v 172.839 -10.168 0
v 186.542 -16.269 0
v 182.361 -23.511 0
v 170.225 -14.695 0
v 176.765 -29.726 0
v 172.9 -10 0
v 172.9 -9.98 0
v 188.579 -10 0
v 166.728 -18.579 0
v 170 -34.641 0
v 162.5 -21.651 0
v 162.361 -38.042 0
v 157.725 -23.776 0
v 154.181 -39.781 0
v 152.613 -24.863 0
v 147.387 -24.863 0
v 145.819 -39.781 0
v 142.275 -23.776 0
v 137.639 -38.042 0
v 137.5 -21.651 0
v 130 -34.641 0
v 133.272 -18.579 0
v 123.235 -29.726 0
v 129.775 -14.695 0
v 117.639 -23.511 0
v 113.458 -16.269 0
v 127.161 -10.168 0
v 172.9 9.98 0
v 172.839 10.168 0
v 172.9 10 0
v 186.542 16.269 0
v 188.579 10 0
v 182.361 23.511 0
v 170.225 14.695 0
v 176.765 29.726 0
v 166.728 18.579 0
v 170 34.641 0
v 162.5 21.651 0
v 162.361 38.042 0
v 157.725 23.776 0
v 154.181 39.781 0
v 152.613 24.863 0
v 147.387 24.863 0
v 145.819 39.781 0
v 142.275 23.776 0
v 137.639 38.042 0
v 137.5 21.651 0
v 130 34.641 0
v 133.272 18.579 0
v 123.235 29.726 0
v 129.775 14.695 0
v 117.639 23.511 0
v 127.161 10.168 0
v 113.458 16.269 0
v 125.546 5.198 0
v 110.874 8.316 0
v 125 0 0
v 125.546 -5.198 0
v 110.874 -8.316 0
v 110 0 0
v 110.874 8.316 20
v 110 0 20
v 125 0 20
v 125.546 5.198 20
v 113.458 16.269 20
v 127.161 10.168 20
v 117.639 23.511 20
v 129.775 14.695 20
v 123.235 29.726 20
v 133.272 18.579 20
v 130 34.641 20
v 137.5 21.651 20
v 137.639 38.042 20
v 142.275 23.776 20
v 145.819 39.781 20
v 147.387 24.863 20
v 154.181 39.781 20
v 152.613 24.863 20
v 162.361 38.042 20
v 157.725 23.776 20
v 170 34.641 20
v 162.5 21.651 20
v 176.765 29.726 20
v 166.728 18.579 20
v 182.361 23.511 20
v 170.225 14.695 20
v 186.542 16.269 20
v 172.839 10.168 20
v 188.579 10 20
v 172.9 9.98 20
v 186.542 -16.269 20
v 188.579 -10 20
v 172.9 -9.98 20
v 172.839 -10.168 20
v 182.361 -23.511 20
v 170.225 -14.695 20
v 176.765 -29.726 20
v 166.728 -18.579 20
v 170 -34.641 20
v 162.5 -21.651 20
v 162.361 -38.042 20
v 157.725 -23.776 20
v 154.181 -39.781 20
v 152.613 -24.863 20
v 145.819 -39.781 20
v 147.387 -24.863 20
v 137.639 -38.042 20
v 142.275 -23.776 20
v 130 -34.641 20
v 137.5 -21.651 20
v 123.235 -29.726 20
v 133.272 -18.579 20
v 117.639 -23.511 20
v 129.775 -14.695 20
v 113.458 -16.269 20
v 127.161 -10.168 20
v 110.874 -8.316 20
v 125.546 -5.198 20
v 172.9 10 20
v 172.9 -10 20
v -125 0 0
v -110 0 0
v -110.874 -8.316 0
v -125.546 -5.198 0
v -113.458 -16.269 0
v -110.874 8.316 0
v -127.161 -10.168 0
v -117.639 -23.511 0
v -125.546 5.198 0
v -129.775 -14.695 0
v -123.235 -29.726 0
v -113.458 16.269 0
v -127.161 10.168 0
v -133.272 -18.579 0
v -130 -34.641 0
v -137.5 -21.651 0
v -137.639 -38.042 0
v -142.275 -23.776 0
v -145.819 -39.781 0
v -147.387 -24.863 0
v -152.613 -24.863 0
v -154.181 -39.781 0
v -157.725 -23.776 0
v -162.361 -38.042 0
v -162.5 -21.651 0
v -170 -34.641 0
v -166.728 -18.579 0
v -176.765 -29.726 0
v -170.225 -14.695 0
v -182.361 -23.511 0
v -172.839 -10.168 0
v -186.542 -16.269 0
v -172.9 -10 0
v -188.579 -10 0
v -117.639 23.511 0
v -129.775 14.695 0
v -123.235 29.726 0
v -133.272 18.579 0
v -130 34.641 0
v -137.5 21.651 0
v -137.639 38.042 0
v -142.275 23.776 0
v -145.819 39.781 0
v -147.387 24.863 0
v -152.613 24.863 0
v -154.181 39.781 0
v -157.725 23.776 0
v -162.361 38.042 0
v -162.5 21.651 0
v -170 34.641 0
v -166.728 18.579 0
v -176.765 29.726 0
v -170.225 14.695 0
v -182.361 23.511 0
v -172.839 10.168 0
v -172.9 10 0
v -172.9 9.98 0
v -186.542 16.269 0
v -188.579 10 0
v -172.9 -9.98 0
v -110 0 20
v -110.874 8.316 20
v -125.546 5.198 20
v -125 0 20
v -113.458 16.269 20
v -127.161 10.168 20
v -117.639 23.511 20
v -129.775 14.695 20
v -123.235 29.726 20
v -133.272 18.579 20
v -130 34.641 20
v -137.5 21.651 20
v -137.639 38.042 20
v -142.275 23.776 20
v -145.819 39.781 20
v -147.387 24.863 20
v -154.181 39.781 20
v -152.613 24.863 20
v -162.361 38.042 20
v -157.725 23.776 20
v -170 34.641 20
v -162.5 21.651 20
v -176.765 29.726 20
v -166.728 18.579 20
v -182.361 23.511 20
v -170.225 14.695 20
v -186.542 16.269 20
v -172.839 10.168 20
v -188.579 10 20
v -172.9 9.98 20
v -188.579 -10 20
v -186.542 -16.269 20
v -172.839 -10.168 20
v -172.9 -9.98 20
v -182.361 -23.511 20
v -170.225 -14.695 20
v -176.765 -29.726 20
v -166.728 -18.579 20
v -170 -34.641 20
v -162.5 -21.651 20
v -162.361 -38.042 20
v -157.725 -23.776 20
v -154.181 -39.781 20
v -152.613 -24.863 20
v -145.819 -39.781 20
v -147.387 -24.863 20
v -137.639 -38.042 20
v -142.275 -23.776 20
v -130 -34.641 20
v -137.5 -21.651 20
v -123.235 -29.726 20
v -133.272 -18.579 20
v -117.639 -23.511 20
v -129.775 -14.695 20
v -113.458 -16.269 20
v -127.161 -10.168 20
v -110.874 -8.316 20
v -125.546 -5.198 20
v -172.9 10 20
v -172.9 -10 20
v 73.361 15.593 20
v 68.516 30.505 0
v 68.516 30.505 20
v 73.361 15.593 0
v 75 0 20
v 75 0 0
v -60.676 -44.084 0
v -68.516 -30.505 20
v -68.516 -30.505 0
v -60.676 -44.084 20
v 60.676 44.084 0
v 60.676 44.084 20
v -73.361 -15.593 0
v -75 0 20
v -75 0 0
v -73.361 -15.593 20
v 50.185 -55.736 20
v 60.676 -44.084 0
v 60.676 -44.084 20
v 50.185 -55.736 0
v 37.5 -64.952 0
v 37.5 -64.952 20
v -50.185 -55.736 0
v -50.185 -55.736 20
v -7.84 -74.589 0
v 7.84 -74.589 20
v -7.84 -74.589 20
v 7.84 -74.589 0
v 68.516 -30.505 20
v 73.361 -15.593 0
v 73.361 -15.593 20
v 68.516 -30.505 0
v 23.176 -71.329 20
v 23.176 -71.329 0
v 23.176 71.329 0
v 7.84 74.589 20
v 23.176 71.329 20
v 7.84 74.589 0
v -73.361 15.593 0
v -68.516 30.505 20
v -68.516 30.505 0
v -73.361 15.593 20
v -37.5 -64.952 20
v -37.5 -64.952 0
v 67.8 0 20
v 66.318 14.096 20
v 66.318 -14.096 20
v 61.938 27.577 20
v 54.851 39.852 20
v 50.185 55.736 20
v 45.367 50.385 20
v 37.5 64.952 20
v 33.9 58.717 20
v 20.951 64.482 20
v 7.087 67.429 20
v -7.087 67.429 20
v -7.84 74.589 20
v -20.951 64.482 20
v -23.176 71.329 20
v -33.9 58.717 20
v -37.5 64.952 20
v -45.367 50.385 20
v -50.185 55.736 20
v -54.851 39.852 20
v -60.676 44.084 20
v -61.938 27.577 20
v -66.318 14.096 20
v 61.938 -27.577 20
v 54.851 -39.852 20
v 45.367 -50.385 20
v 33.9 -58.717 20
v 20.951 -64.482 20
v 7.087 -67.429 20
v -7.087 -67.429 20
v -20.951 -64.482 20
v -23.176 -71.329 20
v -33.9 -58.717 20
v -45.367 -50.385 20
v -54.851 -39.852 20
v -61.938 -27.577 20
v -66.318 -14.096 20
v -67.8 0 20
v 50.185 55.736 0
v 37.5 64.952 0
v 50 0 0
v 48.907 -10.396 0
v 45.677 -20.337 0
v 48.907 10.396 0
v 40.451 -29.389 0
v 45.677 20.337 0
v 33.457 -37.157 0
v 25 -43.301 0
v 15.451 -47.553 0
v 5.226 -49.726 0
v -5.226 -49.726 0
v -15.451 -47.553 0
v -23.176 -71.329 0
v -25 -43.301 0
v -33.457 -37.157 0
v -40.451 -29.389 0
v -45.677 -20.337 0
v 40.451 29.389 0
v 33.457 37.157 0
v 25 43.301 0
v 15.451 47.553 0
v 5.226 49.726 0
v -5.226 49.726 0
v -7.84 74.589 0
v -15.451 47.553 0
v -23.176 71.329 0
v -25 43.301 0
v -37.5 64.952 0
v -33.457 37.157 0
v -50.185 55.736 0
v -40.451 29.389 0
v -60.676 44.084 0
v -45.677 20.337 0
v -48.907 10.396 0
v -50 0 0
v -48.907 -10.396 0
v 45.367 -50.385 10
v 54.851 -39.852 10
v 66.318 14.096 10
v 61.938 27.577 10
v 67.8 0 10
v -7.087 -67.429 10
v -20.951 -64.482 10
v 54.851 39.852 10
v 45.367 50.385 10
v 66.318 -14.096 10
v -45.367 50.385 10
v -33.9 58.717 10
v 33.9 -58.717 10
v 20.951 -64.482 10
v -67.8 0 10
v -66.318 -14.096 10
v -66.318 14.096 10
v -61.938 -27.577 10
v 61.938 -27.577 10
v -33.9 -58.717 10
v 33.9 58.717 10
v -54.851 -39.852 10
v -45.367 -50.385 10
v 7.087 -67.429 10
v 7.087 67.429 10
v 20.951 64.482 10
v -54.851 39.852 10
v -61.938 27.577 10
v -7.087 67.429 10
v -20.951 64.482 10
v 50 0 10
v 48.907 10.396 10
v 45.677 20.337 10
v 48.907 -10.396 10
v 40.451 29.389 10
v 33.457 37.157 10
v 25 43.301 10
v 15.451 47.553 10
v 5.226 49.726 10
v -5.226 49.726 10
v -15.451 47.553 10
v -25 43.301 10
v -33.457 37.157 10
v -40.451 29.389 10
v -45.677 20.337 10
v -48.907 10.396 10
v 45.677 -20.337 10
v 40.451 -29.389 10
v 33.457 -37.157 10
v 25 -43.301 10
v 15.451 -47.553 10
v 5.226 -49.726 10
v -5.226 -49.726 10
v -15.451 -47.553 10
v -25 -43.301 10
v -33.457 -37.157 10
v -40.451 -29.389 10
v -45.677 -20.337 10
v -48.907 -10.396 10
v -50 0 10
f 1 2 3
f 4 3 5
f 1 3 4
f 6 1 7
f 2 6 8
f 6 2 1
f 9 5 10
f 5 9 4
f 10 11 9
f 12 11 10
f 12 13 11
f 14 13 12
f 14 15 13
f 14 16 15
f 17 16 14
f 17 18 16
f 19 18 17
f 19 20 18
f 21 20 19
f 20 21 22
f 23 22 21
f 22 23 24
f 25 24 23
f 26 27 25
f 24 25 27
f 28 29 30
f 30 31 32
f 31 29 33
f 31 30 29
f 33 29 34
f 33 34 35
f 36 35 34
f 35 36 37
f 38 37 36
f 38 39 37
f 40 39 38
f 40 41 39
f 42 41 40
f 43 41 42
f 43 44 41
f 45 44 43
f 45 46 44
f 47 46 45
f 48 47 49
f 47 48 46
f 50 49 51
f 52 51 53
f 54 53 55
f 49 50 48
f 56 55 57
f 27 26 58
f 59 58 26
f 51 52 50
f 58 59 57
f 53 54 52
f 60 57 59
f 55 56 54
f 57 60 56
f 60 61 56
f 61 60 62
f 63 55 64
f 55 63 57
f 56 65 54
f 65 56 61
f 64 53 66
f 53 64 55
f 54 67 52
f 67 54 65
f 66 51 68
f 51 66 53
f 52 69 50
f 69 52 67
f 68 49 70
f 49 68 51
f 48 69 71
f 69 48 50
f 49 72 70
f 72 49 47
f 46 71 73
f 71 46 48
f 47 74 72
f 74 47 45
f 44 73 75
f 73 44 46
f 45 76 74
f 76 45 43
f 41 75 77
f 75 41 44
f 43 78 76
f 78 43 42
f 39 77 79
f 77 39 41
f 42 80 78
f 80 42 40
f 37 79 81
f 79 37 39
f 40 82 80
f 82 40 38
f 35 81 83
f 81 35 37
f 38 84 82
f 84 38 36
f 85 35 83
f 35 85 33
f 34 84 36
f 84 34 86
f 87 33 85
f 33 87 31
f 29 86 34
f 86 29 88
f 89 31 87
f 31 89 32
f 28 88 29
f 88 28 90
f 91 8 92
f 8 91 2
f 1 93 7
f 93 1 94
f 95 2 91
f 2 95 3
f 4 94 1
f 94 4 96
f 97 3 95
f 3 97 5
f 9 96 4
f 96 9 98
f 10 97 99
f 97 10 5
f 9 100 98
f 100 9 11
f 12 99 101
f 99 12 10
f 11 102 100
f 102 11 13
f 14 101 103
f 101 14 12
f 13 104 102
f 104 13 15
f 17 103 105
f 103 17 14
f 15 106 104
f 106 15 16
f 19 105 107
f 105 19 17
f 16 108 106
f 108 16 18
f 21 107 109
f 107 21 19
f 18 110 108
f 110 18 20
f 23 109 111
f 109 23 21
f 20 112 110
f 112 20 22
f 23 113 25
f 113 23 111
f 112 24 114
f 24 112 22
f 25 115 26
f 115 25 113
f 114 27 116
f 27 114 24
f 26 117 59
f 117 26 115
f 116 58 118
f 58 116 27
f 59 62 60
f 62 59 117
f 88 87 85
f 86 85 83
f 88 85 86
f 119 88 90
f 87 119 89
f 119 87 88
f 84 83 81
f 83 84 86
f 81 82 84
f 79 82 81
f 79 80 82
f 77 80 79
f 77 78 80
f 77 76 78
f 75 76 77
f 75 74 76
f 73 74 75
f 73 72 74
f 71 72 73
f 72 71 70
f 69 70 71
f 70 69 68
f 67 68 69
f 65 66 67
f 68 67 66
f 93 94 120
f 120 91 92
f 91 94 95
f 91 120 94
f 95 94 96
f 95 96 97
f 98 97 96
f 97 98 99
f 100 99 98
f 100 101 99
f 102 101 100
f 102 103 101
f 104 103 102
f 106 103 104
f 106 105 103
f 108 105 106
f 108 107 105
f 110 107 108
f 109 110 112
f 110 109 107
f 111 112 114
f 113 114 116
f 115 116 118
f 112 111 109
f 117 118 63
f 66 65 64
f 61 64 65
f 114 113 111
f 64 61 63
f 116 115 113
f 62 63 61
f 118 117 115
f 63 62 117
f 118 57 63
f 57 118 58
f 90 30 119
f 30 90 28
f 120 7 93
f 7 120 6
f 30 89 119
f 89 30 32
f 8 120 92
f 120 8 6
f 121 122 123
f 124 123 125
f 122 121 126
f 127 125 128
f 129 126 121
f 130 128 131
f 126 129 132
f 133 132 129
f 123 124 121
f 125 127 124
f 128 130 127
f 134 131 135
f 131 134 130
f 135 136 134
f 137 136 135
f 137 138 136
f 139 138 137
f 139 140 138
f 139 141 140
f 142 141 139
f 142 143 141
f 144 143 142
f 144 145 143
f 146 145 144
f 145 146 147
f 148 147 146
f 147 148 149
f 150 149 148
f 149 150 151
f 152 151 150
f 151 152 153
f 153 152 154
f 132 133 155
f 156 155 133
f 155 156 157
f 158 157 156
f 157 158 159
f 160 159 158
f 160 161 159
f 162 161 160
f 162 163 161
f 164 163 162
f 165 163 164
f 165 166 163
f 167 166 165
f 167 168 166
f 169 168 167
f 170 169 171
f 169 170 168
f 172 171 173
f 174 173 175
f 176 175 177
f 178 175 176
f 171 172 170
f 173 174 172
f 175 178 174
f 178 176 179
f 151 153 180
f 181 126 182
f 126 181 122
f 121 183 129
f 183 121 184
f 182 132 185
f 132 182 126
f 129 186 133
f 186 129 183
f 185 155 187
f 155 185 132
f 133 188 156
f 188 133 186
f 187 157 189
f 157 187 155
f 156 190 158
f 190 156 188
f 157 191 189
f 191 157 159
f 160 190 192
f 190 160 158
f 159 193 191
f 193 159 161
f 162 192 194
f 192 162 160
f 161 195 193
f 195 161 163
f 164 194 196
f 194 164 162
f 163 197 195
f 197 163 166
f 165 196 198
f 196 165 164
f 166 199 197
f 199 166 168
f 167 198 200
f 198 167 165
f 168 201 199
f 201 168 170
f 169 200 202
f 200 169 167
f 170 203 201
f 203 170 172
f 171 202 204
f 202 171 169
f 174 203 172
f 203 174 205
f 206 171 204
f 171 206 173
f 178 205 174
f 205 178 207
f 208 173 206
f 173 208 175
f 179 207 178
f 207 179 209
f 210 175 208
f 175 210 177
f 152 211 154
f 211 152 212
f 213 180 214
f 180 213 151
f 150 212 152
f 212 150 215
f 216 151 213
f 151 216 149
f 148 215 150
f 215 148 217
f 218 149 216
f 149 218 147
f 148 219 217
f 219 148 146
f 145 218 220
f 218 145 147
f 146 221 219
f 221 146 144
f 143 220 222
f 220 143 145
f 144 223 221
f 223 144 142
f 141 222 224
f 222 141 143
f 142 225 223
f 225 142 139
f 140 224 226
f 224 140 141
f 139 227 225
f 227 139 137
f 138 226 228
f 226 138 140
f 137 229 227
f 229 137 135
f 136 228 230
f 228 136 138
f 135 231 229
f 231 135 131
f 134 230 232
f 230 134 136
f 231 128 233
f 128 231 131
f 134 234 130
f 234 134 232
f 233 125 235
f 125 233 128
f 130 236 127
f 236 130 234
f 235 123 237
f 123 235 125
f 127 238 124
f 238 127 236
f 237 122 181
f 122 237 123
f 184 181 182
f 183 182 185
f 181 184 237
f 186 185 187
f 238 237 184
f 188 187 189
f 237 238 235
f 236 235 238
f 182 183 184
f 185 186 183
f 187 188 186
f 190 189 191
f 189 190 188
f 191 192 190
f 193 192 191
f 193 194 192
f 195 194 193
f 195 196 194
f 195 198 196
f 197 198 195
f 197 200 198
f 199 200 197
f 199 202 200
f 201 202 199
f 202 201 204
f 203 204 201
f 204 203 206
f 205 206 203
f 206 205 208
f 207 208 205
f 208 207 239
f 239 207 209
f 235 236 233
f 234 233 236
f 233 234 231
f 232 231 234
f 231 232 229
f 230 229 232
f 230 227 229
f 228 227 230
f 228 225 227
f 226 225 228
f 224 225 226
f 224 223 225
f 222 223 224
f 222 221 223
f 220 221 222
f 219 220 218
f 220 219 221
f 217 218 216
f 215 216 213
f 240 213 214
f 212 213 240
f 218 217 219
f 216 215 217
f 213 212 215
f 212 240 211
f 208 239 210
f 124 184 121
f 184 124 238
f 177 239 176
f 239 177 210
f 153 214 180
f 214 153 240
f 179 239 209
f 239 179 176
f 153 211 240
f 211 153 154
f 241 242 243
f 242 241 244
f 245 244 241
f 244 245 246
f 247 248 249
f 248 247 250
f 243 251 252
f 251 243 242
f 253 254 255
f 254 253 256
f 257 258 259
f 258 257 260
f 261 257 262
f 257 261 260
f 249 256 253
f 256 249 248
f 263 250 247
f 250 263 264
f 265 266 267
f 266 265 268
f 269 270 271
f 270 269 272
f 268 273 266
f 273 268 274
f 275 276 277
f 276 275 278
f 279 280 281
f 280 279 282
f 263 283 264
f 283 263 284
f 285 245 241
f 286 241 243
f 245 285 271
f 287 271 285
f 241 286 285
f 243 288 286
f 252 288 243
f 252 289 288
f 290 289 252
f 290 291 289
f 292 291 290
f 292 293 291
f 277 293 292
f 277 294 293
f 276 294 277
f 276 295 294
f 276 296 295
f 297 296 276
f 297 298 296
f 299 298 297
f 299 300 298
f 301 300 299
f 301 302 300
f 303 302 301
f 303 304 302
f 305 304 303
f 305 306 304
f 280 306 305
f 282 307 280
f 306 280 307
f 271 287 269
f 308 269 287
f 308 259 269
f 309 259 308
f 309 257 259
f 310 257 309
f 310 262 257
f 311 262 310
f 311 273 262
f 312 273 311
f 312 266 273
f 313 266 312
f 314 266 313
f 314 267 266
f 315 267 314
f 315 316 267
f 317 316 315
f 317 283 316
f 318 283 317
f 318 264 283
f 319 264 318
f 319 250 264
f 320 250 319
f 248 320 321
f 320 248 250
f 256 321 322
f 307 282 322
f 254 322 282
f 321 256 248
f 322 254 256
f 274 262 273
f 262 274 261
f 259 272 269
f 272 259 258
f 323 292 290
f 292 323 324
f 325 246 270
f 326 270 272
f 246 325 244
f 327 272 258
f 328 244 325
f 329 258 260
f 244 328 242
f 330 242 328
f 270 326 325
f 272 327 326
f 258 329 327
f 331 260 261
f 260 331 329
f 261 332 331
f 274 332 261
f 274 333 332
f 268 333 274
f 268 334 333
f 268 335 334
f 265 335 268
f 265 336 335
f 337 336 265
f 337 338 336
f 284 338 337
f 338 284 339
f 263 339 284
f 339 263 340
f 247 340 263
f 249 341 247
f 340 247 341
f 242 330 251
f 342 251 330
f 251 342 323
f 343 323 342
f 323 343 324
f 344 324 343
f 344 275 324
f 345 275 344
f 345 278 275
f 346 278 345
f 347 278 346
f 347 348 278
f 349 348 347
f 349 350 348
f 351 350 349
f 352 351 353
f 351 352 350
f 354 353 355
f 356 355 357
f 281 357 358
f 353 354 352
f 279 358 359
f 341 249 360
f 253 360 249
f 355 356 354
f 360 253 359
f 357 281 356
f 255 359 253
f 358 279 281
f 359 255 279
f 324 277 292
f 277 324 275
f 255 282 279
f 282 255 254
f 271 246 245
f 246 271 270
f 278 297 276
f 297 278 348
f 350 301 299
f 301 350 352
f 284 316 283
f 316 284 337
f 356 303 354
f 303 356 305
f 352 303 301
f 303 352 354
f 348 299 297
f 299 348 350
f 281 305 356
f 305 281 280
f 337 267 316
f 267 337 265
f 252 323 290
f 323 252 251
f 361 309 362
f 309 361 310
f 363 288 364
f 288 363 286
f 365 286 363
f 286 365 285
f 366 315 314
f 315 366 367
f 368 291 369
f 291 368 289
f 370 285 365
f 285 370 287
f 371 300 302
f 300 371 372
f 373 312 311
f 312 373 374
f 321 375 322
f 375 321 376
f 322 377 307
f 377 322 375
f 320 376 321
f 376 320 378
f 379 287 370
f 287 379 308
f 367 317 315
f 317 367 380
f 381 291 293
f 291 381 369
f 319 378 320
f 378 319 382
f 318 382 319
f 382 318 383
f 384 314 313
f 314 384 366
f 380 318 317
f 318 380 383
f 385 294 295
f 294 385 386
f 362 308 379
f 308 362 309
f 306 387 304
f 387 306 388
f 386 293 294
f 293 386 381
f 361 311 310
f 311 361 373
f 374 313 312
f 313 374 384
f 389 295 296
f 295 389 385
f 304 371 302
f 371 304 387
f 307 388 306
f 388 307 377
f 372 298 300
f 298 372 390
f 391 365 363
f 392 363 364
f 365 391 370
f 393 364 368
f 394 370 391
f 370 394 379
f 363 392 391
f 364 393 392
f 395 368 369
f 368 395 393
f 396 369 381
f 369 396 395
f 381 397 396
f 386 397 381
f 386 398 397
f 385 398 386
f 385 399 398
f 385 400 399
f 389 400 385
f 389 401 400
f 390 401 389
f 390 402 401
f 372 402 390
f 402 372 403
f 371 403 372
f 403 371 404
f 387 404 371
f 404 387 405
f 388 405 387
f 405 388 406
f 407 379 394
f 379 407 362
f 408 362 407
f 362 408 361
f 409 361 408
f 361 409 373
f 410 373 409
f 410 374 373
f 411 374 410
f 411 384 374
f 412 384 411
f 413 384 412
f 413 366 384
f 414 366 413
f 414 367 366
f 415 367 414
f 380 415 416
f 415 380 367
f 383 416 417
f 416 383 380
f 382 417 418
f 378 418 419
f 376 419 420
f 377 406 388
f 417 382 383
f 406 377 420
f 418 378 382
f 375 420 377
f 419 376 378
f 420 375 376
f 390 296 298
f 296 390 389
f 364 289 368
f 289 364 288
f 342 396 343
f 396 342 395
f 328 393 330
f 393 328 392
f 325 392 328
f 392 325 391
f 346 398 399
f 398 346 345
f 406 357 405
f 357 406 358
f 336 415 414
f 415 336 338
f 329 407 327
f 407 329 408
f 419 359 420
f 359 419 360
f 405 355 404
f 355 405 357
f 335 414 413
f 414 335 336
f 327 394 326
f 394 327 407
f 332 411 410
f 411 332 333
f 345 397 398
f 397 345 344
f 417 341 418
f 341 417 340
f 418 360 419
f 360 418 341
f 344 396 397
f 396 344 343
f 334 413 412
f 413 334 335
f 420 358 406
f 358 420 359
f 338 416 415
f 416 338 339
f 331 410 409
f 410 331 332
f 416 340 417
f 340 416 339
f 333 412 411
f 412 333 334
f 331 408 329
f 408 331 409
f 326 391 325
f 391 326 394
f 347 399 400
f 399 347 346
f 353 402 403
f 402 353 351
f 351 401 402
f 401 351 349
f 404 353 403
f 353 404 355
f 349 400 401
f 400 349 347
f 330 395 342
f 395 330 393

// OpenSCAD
mirror([115,155,0])
translate([115,155,0])
%circle(120);

mirror([90,0,0])
translate([115,155,0])
%circle(120);

mirror([0,90,0])
translate([115,155,0])
%circle(120);

translate([115,155,0])
%circle(120);


canvas();
//module previous to gluing everything
module canvas(){

translate([150,0,0])
ring_small(20,25,15);

mirror([150,0,0])
translate([150,0,0])
ring_small(20,25,15);

ring_big();
}

//  module implemented with rotational extrusion
module ring_small(height, radius, radial_width) {
    difference(){
  rotate_extrude()
    translate([radius, 0, 0])
      square([radial_width, height]);
    
        translate([radius-2.1, -10, -.1])
        linear_extrude(20.2)
        square([20,20]);
        }
}

// module for nested ring structure
module ring_big(){
difference(){
// El objeto original al que vamos a extruir lo de adentro
linear_extrude(20)
circle(r=75);

// extrusión 1, circulo superior de r=135.6/2 mm
translate([0,0,10])
linear_extrude(10.1)
circle(r=135.6/2);

// extrusión 2, circulo superior de r=50 mm
translate([0,0,-.1])
linear_extrude(10.5)
circle(r=50);
}
}
